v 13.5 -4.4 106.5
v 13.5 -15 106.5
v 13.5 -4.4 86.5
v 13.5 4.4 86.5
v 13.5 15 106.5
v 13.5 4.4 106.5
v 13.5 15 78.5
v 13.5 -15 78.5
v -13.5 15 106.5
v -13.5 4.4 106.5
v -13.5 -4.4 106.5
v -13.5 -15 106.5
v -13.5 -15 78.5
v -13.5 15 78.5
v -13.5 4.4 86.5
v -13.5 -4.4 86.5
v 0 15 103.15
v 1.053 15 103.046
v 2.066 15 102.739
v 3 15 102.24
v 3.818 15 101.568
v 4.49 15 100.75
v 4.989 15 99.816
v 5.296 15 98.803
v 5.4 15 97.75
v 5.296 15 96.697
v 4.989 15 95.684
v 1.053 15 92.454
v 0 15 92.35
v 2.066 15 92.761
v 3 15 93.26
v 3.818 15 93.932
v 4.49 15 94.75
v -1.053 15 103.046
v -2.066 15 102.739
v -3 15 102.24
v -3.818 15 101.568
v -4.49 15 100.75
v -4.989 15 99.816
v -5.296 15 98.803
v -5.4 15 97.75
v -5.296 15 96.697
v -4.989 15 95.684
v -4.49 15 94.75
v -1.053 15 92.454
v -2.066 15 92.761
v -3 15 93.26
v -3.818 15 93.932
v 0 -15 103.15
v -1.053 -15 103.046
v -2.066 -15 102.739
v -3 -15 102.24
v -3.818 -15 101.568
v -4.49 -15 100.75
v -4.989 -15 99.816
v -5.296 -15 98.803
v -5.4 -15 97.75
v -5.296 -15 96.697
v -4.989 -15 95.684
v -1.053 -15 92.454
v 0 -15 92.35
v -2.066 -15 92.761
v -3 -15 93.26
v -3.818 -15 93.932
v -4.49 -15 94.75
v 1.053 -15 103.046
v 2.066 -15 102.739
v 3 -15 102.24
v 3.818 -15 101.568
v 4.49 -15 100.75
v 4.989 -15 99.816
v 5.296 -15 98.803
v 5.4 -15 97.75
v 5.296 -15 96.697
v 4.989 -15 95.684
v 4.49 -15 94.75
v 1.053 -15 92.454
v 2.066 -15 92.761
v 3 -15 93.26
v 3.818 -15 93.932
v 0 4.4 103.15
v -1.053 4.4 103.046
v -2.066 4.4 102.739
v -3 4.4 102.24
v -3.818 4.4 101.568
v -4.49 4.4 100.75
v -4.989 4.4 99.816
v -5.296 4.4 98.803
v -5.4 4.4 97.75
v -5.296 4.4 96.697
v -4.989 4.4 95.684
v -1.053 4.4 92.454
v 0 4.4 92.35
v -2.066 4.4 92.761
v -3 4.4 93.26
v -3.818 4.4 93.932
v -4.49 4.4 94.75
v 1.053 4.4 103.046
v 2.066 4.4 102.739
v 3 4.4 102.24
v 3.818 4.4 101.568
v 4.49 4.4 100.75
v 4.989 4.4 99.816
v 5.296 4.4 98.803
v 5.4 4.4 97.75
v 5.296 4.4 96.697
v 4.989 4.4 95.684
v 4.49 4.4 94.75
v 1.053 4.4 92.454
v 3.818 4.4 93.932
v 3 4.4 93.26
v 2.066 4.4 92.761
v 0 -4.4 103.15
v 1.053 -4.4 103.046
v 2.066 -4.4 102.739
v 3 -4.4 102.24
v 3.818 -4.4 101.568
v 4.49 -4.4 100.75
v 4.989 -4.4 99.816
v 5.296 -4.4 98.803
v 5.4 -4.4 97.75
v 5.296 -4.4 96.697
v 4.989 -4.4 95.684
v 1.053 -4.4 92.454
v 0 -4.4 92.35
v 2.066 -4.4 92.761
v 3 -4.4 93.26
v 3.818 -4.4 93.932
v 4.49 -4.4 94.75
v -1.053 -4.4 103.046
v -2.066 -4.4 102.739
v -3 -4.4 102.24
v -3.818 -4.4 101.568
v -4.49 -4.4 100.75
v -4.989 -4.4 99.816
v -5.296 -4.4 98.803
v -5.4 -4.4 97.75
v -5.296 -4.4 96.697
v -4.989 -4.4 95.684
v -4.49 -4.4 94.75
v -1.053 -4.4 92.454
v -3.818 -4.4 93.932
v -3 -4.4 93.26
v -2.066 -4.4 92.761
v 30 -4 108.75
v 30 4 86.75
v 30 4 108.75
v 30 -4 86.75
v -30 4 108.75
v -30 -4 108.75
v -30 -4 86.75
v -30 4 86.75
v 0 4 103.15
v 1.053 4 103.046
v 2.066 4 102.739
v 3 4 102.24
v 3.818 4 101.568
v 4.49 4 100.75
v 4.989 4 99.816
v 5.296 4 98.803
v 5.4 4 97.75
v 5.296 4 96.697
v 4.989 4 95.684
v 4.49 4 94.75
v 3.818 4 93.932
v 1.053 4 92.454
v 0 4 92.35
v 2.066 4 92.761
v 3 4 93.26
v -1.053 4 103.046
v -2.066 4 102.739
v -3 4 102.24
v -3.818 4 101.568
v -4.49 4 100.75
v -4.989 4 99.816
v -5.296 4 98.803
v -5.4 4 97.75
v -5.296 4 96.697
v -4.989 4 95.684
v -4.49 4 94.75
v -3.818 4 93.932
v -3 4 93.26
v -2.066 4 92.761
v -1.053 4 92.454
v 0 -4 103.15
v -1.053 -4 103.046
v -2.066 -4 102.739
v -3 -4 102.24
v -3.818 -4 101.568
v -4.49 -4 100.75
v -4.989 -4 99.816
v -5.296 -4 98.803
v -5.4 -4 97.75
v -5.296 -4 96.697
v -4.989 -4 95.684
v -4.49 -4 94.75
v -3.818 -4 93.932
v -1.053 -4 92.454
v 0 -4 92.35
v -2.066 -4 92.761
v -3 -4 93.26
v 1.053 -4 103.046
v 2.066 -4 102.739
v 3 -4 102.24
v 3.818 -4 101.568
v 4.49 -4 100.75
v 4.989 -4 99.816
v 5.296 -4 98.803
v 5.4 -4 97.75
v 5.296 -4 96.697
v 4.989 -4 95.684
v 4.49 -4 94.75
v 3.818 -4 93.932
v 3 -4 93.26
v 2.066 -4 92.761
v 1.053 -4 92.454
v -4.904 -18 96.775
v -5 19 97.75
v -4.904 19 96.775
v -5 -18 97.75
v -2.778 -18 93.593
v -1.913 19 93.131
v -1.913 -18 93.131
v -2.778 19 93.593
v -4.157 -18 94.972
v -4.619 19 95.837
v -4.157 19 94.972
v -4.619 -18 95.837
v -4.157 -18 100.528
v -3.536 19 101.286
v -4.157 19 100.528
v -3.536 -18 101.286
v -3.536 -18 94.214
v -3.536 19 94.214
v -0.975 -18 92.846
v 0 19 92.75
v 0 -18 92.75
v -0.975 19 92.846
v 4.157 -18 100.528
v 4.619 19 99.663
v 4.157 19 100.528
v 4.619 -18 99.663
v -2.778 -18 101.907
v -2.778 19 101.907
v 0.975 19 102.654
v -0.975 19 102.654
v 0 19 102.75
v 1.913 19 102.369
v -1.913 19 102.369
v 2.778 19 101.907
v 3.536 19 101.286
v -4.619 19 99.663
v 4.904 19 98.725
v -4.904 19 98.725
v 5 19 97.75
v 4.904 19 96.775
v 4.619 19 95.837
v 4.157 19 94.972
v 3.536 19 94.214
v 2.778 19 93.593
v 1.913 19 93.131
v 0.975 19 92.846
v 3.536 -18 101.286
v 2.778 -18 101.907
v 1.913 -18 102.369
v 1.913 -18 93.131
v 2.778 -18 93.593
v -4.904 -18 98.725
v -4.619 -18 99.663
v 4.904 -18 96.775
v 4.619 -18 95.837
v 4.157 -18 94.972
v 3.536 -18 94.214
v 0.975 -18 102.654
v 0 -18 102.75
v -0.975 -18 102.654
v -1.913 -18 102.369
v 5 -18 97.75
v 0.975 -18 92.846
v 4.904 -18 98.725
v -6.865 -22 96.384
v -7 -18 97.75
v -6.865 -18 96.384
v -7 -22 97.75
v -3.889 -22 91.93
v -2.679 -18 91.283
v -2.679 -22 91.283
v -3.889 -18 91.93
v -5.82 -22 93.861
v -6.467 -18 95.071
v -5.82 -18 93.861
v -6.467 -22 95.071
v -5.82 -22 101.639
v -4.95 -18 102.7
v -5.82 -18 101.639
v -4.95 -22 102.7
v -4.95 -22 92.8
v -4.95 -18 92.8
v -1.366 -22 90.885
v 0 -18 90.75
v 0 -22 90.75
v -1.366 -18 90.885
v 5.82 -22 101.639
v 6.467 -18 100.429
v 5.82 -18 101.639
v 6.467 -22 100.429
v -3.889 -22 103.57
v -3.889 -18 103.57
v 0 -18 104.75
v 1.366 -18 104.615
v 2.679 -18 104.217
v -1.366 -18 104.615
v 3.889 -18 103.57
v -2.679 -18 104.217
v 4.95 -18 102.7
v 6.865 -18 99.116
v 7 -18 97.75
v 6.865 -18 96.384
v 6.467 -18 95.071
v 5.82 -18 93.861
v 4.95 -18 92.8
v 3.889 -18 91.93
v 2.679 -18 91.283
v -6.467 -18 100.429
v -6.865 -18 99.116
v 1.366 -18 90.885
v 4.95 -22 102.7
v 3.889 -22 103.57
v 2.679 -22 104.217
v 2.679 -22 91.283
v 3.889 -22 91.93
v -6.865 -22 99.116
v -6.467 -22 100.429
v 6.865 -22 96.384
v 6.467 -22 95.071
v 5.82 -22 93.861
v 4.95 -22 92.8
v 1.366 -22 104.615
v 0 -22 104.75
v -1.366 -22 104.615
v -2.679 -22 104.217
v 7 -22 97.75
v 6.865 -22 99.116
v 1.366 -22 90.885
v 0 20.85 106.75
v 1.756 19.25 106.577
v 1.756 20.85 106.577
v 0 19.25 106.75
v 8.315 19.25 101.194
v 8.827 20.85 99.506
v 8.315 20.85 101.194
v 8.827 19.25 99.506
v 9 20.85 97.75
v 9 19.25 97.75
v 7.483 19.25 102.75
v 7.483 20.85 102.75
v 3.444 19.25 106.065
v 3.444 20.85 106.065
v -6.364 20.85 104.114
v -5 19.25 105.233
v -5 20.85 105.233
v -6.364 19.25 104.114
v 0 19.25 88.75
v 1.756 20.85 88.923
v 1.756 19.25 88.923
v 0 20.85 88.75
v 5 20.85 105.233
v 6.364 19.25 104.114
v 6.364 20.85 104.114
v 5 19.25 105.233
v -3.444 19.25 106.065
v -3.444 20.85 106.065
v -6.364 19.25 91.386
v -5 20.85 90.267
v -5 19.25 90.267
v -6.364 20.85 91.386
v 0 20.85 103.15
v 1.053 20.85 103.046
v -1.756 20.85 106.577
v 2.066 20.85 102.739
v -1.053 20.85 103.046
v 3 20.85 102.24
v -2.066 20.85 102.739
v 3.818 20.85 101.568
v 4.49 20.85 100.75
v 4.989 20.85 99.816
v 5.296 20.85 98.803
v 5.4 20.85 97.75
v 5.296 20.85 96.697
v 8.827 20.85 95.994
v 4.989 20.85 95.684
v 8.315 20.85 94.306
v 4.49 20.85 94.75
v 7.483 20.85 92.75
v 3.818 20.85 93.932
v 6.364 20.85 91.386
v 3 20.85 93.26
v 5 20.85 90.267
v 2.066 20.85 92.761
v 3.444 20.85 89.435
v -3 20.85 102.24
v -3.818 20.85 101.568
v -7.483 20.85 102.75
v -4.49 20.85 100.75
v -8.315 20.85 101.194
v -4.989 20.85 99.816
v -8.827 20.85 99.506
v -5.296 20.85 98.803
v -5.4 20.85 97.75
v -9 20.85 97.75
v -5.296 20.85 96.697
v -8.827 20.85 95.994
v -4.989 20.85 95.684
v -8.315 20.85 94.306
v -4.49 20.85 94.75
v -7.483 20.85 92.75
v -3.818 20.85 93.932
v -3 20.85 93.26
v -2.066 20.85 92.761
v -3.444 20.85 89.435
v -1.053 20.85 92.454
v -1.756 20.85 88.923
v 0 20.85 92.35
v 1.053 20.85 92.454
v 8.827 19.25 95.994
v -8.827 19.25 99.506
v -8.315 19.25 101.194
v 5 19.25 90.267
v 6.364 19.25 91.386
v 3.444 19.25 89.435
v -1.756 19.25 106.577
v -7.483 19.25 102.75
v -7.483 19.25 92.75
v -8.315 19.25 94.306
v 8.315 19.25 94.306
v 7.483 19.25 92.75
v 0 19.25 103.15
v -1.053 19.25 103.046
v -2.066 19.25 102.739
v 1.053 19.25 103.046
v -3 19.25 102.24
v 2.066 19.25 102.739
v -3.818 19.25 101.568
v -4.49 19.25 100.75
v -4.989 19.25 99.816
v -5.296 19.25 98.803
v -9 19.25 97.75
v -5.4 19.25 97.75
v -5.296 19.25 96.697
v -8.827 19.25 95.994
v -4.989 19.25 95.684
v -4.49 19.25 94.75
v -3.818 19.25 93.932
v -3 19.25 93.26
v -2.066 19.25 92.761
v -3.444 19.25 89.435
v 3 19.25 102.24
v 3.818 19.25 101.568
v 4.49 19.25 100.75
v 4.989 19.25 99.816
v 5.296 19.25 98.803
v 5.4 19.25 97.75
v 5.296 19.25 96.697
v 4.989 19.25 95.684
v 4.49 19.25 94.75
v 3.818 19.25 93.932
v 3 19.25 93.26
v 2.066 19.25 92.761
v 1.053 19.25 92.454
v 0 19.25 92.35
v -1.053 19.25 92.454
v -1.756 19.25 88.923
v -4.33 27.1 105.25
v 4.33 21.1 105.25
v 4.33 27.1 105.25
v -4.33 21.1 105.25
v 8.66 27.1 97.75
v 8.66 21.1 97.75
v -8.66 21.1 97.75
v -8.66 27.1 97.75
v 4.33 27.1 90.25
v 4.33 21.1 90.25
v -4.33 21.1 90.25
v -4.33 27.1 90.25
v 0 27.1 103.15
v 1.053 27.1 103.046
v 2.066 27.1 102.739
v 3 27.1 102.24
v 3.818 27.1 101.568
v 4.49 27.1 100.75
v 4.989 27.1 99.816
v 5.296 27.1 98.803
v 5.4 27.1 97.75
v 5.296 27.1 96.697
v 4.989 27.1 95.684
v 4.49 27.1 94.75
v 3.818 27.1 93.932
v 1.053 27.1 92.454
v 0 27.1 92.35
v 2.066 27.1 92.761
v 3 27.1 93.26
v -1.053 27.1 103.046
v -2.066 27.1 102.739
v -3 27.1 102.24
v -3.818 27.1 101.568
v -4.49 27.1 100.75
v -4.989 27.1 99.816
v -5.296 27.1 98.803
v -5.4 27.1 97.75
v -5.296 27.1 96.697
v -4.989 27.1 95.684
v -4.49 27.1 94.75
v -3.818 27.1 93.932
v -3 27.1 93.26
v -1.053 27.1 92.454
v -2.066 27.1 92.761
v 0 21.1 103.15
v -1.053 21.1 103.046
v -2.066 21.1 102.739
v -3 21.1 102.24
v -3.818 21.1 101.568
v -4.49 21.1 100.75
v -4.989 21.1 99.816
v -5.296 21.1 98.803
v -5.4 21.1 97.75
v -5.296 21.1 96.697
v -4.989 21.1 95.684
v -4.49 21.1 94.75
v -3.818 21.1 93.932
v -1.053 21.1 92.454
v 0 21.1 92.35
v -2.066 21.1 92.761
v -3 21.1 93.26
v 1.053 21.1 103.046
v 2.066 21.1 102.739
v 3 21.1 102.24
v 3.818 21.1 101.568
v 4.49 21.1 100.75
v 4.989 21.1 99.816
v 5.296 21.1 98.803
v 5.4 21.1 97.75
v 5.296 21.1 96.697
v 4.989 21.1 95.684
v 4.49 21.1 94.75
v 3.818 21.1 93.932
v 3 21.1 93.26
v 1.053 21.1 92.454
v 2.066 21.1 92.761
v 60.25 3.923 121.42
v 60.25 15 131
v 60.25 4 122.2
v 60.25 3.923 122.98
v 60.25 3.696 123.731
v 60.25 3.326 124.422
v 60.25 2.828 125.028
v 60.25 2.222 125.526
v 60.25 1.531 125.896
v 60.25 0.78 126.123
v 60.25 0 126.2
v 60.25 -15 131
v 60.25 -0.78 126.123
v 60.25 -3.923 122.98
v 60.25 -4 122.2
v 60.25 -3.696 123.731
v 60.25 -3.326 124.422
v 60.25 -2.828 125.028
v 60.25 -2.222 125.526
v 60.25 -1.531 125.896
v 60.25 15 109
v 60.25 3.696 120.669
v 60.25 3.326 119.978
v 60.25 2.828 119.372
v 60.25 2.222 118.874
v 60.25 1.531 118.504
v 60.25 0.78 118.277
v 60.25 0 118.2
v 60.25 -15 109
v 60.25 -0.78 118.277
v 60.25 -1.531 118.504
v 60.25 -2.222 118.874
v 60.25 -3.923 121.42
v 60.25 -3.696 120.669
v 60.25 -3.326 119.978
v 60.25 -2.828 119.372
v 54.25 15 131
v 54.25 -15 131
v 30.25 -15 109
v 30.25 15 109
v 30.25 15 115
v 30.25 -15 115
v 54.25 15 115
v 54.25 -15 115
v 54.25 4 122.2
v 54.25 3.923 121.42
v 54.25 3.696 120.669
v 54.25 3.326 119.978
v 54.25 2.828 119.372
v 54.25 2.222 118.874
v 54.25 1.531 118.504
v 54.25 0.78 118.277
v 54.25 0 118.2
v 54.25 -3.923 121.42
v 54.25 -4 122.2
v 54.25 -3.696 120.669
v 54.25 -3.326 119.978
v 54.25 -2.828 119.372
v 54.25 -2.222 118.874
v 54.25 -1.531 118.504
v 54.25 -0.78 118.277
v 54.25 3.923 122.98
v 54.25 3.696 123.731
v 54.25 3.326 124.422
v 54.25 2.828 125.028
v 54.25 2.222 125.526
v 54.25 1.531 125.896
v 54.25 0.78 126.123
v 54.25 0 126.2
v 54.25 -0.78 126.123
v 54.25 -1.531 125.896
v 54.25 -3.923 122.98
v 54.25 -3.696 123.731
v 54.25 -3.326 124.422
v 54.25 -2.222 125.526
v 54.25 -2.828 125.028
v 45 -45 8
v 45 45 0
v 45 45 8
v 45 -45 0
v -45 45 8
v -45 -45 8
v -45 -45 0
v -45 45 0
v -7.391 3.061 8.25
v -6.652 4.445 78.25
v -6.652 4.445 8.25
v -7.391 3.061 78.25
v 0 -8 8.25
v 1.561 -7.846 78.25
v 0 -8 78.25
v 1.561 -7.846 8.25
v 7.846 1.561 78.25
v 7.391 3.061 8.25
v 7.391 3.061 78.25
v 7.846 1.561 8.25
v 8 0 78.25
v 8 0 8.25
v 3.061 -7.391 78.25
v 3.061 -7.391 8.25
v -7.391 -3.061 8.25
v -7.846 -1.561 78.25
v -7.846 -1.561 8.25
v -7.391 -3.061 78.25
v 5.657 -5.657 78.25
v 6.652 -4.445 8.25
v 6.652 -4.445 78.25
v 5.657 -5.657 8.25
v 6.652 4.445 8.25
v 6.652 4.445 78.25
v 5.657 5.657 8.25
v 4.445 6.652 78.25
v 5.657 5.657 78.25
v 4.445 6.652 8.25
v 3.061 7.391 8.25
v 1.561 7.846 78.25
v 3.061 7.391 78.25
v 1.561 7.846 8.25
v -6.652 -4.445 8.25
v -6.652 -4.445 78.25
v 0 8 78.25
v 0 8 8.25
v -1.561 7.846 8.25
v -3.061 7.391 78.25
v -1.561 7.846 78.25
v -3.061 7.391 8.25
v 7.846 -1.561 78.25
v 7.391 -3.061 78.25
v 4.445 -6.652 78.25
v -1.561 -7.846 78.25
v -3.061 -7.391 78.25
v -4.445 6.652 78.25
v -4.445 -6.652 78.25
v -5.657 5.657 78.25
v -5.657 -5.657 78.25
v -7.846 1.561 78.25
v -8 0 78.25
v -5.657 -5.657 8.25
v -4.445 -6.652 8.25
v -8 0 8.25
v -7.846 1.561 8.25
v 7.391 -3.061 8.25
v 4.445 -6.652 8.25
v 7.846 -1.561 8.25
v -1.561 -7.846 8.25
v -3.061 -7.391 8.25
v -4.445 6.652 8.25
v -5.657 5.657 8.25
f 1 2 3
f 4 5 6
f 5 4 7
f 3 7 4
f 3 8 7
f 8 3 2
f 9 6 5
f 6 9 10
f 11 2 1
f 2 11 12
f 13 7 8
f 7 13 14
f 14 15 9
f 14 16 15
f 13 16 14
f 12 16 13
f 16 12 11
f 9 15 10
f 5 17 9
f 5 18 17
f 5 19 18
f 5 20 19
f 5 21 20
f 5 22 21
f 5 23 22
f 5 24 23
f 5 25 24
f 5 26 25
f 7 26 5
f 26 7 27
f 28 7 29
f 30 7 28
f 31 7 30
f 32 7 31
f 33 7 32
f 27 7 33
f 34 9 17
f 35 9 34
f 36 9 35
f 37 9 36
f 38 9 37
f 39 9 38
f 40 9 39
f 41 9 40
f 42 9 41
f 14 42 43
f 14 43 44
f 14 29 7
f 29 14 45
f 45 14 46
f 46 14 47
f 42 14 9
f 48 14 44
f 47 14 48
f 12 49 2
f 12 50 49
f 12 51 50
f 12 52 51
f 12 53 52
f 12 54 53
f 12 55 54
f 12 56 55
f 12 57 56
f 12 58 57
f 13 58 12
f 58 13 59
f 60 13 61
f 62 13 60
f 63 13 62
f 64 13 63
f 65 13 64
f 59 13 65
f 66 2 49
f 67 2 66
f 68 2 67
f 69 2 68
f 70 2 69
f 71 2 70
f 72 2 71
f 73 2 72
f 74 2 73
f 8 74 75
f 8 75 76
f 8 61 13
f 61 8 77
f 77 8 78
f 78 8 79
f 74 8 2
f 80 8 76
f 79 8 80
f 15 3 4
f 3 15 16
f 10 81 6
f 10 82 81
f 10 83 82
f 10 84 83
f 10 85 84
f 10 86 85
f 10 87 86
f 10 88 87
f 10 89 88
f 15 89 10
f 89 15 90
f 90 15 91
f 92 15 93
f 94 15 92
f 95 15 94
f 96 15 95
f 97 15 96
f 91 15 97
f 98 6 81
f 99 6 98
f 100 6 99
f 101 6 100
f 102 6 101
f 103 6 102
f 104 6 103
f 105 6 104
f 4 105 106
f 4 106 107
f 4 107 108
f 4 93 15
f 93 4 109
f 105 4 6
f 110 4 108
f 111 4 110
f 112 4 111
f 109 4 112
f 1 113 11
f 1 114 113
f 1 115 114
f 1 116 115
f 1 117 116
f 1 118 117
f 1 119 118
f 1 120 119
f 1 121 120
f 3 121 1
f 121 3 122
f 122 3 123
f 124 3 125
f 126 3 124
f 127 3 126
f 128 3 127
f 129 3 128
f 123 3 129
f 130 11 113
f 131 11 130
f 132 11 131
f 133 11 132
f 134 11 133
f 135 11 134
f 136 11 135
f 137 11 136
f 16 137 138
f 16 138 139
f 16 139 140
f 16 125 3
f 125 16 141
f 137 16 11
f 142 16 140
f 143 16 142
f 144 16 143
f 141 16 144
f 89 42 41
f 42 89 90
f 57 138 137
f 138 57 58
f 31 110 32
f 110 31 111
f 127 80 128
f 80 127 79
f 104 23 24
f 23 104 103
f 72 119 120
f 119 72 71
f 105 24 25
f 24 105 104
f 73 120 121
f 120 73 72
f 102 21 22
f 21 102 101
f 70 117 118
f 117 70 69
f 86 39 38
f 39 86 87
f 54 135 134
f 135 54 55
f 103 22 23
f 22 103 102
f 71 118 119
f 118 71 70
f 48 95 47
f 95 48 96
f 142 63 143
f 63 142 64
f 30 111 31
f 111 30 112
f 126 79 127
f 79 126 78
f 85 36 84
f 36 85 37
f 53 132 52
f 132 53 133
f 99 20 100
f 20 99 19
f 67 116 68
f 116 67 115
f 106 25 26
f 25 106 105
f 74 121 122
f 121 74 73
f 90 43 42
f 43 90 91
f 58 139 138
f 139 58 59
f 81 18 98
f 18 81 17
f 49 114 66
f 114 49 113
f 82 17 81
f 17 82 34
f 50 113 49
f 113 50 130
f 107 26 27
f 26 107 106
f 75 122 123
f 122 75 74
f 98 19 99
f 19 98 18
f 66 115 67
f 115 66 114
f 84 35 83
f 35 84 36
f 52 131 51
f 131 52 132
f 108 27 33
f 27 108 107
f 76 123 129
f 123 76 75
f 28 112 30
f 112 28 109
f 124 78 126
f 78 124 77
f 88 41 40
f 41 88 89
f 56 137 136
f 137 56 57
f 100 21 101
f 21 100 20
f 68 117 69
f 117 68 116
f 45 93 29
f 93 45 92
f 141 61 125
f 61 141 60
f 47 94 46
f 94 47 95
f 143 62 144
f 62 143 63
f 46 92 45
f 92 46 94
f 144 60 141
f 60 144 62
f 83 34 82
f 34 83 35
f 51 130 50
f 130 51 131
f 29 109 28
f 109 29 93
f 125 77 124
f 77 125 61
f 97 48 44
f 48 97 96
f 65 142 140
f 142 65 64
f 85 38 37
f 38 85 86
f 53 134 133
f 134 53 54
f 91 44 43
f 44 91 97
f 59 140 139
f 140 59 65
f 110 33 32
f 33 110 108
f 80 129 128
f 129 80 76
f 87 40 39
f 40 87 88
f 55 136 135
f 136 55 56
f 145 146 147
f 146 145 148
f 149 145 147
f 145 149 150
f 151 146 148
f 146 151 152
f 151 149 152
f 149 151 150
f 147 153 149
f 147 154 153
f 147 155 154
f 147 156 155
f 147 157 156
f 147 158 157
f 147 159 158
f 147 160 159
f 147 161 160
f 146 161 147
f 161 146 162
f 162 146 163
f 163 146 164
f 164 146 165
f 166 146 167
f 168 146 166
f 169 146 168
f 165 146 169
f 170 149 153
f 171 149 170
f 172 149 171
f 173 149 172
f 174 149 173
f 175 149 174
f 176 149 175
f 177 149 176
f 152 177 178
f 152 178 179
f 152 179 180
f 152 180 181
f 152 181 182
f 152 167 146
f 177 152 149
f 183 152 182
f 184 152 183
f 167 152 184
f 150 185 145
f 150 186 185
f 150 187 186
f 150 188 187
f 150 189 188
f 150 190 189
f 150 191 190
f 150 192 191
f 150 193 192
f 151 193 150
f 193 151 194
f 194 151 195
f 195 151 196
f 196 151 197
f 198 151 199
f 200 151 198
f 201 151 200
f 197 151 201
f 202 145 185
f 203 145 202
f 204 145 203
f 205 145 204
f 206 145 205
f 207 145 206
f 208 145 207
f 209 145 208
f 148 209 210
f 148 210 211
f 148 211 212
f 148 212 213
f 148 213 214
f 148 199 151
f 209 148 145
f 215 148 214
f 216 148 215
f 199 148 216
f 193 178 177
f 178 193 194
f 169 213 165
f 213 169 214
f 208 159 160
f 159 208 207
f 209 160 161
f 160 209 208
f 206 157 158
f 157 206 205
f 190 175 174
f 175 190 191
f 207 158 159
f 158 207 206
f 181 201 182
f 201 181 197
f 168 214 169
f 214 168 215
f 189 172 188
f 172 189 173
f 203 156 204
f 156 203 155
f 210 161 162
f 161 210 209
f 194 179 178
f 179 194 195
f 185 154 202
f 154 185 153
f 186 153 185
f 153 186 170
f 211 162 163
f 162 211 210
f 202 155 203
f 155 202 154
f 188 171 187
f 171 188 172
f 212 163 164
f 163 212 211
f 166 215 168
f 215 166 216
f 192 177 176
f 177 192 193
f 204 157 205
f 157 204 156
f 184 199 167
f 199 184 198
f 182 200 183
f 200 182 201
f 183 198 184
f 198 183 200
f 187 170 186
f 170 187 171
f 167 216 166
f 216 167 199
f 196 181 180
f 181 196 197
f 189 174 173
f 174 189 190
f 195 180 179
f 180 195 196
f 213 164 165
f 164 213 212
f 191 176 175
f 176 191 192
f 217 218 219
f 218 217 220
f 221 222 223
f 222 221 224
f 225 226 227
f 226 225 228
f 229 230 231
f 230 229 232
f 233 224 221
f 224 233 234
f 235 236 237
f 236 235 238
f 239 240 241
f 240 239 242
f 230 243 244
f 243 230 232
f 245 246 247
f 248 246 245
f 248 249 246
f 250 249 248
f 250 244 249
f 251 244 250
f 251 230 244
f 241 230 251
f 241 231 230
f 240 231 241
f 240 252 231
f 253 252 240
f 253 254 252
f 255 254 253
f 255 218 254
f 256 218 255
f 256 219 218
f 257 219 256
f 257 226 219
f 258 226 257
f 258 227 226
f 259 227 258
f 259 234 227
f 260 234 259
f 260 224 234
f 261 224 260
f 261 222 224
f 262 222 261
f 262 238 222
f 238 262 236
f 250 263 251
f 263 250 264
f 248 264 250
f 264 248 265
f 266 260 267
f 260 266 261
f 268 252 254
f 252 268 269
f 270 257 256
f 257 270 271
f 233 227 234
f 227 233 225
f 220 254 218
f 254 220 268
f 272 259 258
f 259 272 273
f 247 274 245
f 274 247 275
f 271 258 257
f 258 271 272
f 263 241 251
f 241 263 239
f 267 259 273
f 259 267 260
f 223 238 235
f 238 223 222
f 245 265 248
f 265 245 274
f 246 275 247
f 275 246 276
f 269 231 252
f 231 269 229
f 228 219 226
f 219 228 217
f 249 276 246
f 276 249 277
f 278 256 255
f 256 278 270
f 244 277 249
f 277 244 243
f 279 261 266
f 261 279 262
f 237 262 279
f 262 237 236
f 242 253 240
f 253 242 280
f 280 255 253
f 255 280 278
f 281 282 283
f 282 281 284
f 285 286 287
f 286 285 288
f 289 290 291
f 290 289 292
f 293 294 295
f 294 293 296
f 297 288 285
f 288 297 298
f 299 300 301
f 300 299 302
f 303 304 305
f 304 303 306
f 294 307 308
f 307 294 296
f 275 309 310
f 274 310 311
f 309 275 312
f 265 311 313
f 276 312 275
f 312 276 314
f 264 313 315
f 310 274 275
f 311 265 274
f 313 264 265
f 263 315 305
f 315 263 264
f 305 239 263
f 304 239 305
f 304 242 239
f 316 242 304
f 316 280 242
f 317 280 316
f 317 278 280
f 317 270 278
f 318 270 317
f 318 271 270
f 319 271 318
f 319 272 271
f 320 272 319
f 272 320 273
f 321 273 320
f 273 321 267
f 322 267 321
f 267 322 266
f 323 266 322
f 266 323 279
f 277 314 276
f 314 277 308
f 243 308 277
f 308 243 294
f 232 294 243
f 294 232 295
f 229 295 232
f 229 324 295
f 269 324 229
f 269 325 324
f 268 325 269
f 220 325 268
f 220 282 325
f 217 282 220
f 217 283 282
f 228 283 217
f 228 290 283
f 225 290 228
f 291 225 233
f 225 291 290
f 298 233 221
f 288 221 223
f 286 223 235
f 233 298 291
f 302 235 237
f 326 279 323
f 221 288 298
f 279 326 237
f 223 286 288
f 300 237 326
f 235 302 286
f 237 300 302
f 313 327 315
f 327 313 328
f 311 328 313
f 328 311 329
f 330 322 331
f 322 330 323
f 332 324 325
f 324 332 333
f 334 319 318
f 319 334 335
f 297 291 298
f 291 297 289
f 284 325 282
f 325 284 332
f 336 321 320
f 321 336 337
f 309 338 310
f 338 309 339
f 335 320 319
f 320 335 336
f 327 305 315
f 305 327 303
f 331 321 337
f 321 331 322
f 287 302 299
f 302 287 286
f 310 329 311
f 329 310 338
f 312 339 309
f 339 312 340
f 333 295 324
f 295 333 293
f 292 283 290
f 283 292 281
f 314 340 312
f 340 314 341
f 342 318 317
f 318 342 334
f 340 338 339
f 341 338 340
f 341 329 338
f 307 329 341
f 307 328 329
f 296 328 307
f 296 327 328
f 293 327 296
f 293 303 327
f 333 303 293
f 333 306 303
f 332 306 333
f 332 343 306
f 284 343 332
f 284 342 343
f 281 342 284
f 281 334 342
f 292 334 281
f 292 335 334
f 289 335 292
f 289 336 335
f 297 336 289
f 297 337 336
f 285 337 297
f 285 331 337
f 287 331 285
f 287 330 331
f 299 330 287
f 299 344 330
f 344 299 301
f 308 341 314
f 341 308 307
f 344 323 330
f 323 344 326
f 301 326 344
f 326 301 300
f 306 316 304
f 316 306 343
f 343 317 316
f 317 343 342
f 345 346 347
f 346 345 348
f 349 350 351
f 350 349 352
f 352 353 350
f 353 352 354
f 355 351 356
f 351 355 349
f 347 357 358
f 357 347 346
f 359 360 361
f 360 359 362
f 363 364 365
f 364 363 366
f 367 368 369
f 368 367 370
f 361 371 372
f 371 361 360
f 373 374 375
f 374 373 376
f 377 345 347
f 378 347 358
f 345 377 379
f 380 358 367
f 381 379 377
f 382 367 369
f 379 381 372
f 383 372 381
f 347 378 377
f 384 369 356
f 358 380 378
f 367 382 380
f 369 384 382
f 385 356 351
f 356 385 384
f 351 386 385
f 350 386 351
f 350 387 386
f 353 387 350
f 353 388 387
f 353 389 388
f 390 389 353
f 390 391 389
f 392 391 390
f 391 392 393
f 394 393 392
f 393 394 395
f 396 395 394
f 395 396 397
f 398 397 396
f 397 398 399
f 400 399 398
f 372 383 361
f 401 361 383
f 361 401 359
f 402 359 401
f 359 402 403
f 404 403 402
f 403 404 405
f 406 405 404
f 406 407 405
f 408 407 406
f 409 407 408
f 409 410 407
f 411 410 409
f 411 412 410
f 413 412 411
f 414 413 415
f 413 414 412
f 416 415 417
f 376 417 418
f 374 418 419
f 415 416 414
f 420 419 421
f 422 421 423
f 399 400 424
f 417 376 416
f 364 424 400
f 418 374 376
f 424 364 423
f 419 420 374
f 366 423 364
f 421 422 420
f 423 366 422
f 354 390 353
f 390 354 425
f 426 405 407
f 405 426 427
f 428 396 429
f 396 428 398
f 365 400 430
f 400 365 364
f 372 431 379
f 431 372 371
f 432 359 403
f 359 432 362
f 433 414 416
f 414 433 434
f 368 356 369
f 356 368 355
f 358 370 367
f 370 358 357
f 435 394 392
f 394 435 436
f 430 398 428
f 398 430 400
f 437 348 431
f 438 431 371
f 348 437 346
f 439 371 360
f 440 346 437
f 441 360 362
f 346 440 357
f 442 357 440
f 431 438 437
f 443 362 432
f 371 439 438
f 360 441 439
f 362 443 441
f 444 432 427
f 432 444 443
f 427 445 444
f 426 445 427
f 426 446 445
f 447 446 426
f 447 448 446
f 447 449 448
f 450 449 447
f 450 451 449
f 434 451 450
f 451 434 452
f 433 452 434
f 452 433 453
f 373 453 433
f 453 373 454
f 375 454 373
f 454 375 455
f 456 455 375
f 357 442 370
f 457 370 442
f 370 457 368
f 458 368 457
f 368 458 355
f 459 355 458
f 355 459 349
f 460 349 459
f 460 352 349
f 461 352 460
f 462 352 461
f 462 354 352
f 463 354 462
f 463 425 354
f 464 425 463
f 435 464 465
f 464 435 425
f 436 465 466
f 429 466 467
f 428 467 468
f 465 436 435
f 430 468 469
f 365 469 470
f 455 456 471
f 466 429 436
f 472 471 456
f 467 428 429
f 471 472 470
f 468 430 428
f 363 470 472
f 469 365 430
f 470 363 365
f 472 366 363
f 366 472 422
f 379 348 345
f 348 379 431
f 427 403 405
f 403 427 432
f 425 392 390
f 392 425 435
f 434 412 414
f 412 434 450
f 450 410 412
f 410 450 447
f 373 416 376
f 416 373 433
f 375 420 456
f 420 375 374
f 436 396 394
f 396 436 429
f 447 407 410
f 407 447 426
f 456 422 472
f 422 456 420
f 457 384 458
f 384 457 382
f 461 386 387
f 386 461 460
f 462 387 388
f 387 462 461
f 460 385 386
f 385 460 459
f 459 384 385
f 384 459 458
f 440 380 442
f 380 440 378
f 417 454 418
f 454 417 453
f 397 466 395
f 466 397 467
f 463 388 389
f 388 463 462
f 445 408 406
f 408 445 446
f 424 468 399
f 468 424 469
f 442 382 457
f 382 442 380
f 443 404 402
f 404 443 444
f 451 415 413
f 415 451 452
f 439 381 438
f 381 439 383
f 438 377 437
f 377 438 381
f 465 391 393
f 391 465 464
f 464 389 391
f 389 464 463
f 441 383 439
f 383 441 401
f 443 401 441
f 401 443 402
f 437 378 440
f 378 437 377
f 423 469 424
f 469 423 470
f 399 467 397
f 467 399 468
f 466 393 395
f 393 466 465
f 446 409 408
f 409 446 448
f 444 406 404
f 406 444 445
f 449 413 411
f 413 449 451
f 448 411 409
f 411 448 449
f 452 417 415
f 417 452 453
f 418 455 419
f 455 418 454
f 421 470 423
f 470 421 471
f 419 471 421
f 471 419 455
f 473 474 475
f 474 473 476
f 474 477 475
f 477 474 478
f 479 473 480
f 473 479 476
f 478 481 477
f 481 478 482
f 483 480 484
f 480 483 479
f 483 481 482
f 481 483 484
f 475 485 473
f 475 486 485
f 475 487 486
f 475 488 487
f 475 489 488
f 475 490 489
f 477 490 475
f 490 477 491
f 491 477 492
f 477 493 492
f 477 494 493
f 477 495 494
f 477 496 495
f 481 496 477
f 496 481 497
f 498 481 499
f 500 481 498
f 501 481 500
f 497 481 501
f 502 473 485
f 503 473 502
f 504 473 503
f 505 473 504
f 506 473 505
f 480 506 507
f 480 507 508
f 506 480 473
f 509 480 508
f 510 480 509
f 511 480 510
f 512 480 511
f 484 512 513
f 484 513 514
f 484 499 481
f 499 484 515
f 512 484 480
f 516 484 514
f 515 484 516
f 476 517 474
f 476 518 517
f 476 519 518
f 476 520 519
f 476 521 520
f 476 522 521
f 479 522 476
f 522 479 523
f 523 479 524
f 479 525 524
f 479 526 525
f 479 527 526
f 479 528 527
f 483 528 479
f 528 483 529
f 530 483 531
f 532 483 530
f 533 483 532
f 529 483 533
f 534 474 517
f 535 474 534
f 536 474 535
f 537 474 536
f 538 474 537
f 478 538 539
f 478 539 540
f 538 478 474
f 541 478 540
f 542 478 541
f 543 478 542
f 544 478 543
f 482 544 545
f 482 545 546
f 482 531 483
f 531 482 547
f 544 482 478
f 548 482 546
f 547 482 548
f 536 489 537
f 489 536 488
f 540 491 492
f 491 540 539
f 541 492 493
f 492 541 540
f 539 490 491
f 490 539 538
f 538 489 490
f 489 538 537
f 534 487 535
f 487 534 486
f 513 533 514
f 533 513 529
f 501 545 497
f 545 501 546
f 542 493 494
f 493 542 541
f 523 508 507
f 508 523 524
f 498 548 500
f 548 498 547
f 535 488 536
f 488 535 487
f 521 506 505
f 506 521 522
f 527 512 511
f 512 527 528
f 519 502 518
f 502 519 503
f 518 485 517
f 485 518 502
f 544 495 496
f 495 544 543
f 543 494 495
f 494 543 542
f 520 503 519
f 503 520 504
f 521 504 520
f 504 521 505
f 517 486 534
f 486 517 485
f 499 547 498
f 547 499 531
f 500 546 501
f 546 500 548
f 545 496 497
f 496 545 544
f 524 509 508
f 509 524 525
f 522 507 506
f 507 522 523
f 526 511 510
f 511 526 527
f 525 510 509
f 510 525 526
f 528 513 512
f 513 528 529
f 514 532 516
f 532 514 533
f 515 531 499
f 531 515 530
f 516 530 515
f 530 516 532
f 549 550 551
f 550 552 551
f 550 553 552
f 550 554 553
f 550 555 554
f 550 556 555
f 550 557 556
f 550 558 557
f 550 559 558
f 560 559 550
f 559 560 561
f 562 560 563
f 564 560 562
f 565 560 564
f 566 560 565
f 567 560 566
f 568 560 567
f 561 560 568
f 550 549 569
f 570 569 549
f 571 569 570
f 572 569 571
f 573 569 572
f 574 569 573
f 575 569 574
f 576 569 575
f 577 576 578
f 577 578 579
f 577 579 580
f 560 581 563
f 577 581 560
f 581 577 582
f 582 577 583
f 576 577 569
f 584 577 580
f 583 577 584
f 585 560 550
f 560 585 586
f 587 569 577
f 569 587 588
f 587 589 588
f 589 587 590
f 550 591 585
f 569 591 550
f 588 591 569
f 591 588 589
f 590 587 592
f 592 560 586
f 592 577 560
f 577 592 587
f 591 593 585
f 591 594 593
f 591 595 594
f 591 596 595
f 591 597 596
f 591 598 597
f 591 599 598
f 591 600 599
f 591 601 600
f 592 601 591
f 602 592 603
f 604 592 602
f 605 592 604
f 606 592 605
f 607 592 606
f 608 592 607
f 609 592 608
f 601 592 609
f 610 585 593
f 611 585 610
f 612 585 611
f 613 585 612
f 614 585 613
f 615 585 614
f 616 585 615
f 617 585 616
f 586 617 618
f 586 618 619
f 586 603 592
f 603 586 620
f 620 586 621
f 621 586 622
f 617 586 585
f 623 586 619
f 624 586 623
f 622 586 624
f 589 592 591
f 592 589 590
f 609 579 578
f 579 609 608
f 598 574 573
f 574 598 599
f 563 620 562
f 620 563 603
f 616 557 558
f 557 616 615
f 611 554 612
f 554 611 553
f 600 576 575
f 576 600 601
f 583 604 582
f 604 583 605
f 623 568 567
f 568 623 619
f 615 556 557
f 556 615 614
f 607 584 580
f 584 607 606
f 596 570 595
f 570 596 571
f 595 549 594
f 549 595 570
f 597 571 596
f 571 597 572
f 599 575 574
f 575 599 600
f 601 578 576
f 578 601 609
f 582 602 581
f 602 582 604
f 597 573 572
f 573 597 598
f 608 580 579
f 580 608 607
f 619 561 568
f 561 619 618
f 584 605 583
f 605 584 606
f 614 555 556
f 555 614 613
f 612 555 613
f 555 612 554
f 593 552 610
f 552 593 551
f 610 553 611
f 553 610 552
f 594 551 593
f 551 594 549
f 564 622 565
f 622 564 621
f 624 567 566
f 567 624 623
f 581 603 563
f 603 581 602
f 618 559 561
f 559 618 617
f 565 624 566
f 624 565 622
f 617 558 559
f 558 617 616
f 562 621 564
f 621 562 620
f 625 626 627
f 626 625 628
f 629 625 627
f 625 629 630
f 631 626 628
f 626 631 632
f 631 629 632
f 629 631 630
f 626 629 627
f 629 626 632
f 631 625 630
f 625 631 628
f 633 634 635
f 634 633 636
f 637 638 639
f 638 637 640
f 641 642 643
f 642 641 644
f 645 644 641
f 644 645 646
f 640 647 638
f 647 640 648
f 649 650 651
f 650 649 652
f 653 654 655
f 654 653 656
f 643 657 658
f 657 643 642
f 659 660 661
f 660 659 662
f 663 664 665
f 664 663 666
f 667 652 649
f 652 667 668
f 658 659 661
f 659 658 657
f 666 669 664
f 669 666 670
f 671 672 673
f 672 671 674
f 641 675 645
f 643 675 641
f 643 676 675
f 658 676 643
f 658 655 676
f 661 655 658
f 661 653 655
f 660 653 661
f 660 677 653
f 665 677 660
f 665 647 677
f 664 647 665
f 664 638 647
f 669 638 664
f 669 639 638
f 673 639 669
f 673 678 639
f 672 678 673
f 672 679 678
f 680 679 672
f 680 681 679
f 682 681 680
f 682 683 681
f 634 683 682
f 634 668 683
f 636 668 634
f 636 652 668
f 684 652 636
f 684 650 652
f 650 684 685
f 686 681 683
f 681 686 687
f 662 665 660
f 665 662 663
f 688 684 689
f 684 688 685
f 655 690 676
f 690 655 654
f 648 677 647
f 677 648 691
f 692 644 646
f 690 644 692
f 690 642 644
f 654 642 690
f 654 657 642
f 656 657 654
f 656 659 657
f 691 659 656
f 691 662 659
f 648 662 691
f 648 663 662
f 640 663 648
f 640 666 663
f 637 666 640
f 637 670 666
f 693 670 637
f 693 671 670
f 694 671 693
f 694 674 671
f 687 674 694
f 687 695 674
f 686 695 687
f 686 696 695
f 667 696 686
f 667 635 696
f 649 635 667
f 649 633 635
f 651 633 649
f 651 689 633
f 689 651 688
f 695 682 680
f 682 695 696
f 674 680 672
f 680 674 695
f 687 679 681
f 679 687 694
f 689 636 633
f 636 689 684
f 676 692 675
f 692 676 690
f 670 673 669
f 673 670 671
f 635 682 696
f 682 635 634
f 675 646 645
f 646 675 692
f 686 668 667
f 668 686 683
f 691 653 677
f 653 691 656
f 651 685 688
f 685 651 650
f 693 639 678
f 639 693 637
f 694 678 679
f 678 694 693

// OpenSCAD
$fn = 32;

// ------------------------------------------------------------------------
// Lamp arm: column d16 x 70 mm, arm 60 mm
// Every part is its own module, assembly() places every instance.
// ------------------------------------------------------------------------

// --- part 1 ---
module lamp_base() {
  difference() {
    translate([-45, -45, 0]) cube([90, 90, 8]);
  }
}

// --- part 2 ---
module lamp_column() {
  cylinder(h = 70, d = 16);
}

// --- part 3 ---
module head_fork() {
  difference() {
    translate([-13.5, -15, 0]) cube([27, 30, 28]);
    translate([-14.5, -4.4, 8]) cube([29, 8.8, 21]);
    translate([0, 0, 19.25]) rotate([90, 0, 0]) cylinder(h = 32, d = 10.8, center = true);
  }
}

// --- part 4 ---
module lamp_arm() {
  difference() {
    translate([-30, -4, 0]) cube([60, 8, 22]);
    translate([0, 0, 11]) rotate([90, 0, 0]) cylinder(h = 10, d = 10.8, center = true);
  }
}

// --- part 5 ---
module arm_pin() {
  rotate([0, 90, 0]) cylinder(h = 38, d = 10, center = true);
  translate([-22, 0, 0]) rotate([0, 90, 0]) cylinder(h = 4, d = 14);
}

// --- part 6 ---
module arm_washer() {
  difference() {
      translate([0, 0, 0]) cylinder(h = 1.6, d = 18);
      translate([0, 0, -1]) cylinder(h = 3.6, d = 10.8);
    }
}

// --- part 7 ---
module arm_nut() {
  difference() {
    linear_extrude(height = 6) polygon(points = [[8.66, 0], [4.33, 7.5], [-4.33, 7.5], [-8.66, 0], [-4.33, -7.5], [4.33, -7.5]]);
    translate([0, 0, -1]) cylinder(h = 8, d = 10.8);
  }
}

// --- part 8 ---
module shade_bracket() {
  difference() {
    translate([-15, -15, 0]) cube([30, 30, 22]);
    translate([-16, -16, 6]) cube([25, 32, 17]);
    translate([12, 0, 13.2]) rotate([0, 90, 0]) cylinder(h = 8, d = 8, center = true);
  }
}

// --- assembly ---
module assembly() {
  color([0.80, 0.24, 0.20]) translate([0, 0, 0]) rotate([0, 0, 0]) lamp_base();
  color([0.20, 0.45, 0.75]) translate([0, 0, 8.25]) rotate([0, 0, 0]) lamp_column();
  color([0.25, 0.62, 0.32]) translate([0, 0, 78.5]) rotate([0, 0, 0]) head_fork();
  color([0.92, 0.70, 0.18]) translate([0, 0, 86.75]) rotate([0, 0, 0]) lamp_arm();
  color([0.58, 0.35, 0.70]) translate([0, 0, 97.75]) rotate([0, 0, 90]) arm_pin();
  color([0.16, 0.66, 0.66]) translate([0, 20.85, 97.75]) rotate([90, 0, 0]) arm_washer();
  color([0.85, 0.48, 0.18]) translate([0, 27.1, 97.75]) rotate([90, 0, 0]) arm_nut();
  color([0.55, 0.60, 0.65]) translate([45.25, 0, 109]) rotate([0, 0, 0]) shade_bracket();
}

assembly();
